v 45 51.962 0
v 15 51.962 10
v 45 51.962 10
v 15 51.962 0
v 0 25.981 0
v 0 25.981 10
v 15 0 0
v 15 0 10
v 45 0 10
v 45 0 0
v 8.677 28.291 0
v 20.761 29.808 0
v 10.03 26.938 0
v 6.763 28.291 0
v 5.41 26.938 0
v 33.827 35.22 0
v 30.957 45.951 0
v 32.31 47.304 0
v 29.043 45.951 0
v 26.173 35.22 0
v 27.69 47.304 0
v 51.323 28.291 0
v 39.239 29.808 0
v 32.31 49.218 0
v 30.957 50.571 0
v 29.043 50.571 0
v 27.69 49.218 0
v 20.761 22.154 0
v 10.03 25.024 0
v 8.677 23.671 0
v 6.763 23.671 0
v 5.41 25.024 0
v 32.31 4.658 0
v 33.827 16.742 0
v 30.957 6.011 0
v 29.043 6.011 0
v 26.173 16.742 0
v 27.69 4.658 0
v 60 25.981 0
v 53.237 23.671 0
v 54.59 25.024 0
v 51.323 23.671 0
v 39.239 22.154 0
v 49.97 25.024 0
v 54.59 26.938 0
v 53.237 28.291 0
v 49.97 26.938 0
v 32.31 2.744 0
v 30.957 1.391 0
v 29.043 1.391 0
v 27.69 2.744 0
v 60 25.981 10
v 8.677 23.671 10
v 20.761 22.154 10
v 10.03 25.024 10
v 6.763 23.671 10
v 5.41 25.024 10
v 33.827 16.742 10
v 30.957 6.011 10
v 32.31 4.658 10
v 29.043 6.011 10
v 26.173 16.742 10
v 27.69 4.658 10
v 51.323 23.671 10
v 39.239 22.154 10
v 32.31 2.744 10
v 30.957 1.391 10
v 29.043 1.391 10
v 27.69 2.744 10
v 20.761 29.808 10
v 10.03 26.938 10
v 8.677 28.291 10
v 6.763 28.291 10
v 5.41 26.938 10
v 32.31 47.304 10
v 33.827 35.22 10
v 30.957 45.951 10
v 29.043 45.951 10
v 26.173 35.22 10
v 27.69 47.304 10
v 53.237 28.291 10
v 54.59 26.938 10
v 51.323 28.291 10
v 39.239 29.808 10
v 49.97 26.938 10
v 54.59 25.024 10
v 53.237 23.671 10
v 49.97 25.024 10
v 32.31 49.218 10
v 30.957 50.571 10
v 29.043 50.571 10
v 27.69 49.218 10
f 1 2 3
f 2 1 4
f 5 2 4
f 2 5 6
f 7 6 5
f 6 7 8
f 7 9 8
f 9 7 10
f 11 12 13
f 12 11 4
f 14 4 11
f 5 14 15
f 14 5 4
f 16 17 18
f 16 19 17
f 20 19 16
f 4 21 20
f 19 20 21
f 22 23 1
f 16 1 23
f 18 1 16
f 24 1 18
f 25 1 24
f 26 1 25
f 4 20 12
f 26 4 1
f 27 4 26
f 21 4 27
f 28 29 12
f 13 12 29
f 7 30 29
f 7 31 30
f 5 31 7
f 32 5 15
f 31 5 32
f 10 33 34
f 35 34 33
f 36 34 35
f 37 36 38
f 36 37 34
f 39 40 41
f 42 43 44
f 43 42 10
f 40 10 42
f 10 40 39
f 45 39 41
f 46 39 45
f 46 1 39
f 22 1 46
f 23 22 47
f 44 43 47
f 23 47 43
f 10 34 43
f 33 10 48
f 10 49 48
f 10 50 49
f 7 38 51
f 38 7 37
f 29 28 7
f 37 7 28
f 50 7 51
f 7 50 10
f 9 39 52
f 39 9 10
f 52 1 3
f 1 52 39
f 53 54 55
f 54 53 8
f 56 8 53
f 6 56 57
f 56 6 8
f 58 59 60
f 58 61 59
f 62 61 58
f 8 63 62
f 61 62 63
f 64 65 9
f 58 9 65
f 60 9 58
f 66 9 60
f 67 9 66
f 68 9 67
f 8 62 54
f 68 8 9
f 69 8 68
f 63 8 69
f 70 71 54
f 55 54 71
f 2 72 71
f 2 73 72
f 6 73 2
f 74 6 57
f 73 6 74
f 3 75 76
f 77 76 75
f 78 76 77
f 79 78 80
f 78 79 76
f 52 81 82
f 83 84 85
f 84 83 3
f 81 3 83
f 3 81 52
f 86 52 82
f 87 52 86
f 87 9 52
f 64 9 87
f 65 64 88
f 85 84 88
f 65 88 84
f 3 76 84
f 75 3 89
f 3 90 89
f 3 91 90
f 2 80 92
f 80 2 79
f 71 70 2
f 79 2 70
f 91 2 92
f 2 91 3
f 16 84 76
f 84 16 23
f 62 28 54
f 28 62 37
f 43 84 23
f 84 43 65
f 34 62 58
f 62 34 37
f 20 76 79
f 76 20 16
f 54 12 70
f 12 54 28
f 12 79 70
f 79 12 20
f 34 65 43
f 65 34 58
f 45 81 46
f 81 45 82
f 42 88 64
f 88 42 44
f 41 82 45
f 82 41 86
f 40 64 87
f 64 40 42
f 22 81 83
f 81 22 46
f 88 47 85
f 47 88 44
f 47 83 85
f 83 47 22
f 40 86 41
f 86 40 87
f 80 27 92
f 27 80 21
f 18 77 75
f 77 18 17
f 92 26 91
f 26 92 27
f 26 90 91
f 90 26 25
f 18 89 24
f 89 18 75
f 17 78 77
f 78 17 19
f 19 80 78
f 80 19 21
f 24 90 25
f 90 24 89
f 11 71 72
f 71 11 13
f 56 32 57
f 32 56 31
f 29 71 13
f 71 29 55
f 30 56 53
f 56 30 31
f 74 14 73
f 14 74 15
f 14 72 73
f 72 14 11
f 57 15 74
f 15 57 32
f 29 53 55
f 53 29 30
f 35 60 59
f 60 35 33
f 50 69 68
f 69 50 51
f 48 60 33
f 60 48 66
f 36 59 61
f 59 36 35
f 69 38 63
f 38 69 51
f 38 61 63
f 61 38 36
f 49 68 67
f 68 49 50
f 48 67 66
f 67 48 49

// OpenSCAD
$fn = 32;

// ----------------------------------------------------------------------
// Polygon plate: 6-gon R30, 4 bolt windows
// ----------------------------------------------------------------------

// --- parameters (mm) ---
sides = 6;                // number of polygon sides
plate_r = 30;             // circumscribed radius of the polygon
bore_r = 10;              // centre bore radius
bolts = 4;                // number of bolt windows
ring_r = 22.28;           // bolt-circle radius
bolt_r = 2.5;             // bolt window radius
plate_t = 10;             // plate thickness, Z (extrusion height)

plate_d = 2 * plate_r;  // circumscribed diameter
bore_d = 2 * bore_r;  // centre bore diameter
bolt_d = 2 * bolt_r;  // bolt window diameter
ring_d = 2 * ring_r;  // bolt-circle diameter

profile = [[60, 25.981], [45, 51.962], [15, 51.962], [0, 25.981], [15, 0], [45, 0]];  // primary outline, 6 points, counter clockwise
void_1 = [[39.239, 29.808], [33.827, 35.22], [26.173, 35.22], [20.761, 29.808], [20.761, 22.154], [26.173, 16.742], [33.827, 16.742], [39.239, 22.154]];  // centre bore, 8 points
void_2 = [[54.59, 26.938], [53.237, 28.291], [51.323, 28.291], [49.97, 26.938], [49.97, 25.024], [51.323, 23.671], [53.237, 23.671], [54.59, 25.024]];  // bolt window 1, 8 points
void_3 = [[32.31, 49.218], [30.957, 50.571], [29.043, 50.571], [27.69, 49.218], [27.69, 47.304], [29.043, 45.951], [30.957, 45.951], [32.31, 47.304]];  // bolt window 2, 8 points
void_4 = [[10.03, 26.938], [8.677, 28.291], [6.763, 28.291], [5.41, 26.938], [5.41, 25.024], [6.763, 23.671], [8.677, 23.671], [10.03, 25.024]];  // bolt window 3, 8 points
void_5 = [[32.31, 4.658], [30.957, 6.011], [29.043, 6.011], [27.69, 4.658], [27.69, 2.744], [29.043, 1.391], [30.957, 1.391], [32.31, 2.744]];  // bolt window 4, 8 points

// --- the one profile operation ---
difference() {
  linear_extrude(height = plate_t) polygon(points = profile);
  translate([0, 0, -1])
    linear_extrude(height = plate_t + 2) polygon(points = void_1);
  translate([0, 0, -1])
    linear_extrude(height = plate_t + 2) polygon(points = void_2);
  translate([0, 0, -1])
    linear_extrude(height = plate_t + 2) polygon(points = void_3);
  translate([0, 0, -1])
    linear_extrude(height = plate_t + 2) polygon(points = void_4);
  translate([0, 0, -1])
    linear_extrude(height = plate_t + 2) polygon(points = void_5);
}
